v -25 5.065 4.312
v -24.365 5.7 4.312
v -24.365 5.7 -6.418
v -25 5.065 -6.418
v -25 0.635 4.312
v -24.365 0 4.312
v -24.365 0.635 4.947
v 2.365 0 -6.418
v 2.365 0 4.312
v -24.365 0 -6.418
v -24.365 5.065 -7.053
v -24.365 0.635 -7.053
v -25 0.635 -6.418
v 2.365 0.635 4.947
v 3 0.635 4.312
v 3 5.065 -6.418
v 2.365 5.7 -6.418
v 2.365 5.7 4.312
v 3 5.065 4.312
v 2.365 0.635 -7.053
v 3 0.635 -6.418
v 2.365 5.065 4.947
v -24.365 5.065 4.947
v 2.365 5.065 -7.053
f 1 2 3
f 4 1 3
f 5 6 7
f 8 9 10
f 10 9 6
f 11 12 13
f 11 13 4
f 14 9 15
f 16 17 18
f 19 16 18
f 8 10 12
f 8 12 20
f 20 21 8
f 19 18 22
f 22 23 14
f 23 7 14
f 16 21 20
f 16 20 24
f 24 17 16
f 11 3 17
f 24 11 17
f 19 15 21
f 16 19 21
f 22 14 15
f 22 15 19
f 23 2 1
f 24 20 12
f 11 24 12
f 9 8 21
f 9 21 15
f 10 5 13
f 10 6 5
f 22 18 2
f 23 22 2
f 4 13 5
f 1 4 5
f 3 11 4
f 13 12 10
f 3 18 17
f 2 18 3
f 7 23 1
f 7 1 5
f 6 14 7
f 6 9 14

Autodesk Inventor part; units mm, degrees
ref_plane "YZ Plane" through (0, 0, 0) normal (1, 0, 0) x (0, 1, 0)
ref_plane "XZ Plane" through (0, 0, 0) normal (0, 1, 0) x (-1, 0, 0)
ref_plane "XY Plane" through (0, 0, 0) normal (0, 0, 1) x (1, 0, 0)
sketch "Sketch1" plane through (0, 0, 0) normal (0, 1, 0) x (-1, 0, 0)
  line L0 (25, 4.9474) -> (-3, 4.9474)
  line L1 (-3, 4.9474) -> (-3, -7.0526)
  line L2 (-3, -7.0526) -> (25, -7.0526)
  line L3 (25, -7.0526) -> (25, 4.9474)
  point P0 (0, 0)
  dimension "d0" = 12
  dimension "d1" = 28
extrude "Extrusion1" add sketch "Sketch1" along normal blind 5.7
chamfer "Chamfer1" distance 0.635 angle 45 12 edges at (-11, 5.7, 4.9474) (-11, 5.7, -7.0526) (3, 5.7, -1.0526) (-11, 0, 4.9474) (3, 0, -1.0526) (3, 2.85, -7.0526) (3, 2.85, 4.9474) (-11, 0, -7.0526) (-25, 2.85, -7.0526) (-25, 0, -1.0526) (-25, 5.7, -1.0526) (-25, 2.85, 4.9474)
properties part number "Battery_3.7V"
